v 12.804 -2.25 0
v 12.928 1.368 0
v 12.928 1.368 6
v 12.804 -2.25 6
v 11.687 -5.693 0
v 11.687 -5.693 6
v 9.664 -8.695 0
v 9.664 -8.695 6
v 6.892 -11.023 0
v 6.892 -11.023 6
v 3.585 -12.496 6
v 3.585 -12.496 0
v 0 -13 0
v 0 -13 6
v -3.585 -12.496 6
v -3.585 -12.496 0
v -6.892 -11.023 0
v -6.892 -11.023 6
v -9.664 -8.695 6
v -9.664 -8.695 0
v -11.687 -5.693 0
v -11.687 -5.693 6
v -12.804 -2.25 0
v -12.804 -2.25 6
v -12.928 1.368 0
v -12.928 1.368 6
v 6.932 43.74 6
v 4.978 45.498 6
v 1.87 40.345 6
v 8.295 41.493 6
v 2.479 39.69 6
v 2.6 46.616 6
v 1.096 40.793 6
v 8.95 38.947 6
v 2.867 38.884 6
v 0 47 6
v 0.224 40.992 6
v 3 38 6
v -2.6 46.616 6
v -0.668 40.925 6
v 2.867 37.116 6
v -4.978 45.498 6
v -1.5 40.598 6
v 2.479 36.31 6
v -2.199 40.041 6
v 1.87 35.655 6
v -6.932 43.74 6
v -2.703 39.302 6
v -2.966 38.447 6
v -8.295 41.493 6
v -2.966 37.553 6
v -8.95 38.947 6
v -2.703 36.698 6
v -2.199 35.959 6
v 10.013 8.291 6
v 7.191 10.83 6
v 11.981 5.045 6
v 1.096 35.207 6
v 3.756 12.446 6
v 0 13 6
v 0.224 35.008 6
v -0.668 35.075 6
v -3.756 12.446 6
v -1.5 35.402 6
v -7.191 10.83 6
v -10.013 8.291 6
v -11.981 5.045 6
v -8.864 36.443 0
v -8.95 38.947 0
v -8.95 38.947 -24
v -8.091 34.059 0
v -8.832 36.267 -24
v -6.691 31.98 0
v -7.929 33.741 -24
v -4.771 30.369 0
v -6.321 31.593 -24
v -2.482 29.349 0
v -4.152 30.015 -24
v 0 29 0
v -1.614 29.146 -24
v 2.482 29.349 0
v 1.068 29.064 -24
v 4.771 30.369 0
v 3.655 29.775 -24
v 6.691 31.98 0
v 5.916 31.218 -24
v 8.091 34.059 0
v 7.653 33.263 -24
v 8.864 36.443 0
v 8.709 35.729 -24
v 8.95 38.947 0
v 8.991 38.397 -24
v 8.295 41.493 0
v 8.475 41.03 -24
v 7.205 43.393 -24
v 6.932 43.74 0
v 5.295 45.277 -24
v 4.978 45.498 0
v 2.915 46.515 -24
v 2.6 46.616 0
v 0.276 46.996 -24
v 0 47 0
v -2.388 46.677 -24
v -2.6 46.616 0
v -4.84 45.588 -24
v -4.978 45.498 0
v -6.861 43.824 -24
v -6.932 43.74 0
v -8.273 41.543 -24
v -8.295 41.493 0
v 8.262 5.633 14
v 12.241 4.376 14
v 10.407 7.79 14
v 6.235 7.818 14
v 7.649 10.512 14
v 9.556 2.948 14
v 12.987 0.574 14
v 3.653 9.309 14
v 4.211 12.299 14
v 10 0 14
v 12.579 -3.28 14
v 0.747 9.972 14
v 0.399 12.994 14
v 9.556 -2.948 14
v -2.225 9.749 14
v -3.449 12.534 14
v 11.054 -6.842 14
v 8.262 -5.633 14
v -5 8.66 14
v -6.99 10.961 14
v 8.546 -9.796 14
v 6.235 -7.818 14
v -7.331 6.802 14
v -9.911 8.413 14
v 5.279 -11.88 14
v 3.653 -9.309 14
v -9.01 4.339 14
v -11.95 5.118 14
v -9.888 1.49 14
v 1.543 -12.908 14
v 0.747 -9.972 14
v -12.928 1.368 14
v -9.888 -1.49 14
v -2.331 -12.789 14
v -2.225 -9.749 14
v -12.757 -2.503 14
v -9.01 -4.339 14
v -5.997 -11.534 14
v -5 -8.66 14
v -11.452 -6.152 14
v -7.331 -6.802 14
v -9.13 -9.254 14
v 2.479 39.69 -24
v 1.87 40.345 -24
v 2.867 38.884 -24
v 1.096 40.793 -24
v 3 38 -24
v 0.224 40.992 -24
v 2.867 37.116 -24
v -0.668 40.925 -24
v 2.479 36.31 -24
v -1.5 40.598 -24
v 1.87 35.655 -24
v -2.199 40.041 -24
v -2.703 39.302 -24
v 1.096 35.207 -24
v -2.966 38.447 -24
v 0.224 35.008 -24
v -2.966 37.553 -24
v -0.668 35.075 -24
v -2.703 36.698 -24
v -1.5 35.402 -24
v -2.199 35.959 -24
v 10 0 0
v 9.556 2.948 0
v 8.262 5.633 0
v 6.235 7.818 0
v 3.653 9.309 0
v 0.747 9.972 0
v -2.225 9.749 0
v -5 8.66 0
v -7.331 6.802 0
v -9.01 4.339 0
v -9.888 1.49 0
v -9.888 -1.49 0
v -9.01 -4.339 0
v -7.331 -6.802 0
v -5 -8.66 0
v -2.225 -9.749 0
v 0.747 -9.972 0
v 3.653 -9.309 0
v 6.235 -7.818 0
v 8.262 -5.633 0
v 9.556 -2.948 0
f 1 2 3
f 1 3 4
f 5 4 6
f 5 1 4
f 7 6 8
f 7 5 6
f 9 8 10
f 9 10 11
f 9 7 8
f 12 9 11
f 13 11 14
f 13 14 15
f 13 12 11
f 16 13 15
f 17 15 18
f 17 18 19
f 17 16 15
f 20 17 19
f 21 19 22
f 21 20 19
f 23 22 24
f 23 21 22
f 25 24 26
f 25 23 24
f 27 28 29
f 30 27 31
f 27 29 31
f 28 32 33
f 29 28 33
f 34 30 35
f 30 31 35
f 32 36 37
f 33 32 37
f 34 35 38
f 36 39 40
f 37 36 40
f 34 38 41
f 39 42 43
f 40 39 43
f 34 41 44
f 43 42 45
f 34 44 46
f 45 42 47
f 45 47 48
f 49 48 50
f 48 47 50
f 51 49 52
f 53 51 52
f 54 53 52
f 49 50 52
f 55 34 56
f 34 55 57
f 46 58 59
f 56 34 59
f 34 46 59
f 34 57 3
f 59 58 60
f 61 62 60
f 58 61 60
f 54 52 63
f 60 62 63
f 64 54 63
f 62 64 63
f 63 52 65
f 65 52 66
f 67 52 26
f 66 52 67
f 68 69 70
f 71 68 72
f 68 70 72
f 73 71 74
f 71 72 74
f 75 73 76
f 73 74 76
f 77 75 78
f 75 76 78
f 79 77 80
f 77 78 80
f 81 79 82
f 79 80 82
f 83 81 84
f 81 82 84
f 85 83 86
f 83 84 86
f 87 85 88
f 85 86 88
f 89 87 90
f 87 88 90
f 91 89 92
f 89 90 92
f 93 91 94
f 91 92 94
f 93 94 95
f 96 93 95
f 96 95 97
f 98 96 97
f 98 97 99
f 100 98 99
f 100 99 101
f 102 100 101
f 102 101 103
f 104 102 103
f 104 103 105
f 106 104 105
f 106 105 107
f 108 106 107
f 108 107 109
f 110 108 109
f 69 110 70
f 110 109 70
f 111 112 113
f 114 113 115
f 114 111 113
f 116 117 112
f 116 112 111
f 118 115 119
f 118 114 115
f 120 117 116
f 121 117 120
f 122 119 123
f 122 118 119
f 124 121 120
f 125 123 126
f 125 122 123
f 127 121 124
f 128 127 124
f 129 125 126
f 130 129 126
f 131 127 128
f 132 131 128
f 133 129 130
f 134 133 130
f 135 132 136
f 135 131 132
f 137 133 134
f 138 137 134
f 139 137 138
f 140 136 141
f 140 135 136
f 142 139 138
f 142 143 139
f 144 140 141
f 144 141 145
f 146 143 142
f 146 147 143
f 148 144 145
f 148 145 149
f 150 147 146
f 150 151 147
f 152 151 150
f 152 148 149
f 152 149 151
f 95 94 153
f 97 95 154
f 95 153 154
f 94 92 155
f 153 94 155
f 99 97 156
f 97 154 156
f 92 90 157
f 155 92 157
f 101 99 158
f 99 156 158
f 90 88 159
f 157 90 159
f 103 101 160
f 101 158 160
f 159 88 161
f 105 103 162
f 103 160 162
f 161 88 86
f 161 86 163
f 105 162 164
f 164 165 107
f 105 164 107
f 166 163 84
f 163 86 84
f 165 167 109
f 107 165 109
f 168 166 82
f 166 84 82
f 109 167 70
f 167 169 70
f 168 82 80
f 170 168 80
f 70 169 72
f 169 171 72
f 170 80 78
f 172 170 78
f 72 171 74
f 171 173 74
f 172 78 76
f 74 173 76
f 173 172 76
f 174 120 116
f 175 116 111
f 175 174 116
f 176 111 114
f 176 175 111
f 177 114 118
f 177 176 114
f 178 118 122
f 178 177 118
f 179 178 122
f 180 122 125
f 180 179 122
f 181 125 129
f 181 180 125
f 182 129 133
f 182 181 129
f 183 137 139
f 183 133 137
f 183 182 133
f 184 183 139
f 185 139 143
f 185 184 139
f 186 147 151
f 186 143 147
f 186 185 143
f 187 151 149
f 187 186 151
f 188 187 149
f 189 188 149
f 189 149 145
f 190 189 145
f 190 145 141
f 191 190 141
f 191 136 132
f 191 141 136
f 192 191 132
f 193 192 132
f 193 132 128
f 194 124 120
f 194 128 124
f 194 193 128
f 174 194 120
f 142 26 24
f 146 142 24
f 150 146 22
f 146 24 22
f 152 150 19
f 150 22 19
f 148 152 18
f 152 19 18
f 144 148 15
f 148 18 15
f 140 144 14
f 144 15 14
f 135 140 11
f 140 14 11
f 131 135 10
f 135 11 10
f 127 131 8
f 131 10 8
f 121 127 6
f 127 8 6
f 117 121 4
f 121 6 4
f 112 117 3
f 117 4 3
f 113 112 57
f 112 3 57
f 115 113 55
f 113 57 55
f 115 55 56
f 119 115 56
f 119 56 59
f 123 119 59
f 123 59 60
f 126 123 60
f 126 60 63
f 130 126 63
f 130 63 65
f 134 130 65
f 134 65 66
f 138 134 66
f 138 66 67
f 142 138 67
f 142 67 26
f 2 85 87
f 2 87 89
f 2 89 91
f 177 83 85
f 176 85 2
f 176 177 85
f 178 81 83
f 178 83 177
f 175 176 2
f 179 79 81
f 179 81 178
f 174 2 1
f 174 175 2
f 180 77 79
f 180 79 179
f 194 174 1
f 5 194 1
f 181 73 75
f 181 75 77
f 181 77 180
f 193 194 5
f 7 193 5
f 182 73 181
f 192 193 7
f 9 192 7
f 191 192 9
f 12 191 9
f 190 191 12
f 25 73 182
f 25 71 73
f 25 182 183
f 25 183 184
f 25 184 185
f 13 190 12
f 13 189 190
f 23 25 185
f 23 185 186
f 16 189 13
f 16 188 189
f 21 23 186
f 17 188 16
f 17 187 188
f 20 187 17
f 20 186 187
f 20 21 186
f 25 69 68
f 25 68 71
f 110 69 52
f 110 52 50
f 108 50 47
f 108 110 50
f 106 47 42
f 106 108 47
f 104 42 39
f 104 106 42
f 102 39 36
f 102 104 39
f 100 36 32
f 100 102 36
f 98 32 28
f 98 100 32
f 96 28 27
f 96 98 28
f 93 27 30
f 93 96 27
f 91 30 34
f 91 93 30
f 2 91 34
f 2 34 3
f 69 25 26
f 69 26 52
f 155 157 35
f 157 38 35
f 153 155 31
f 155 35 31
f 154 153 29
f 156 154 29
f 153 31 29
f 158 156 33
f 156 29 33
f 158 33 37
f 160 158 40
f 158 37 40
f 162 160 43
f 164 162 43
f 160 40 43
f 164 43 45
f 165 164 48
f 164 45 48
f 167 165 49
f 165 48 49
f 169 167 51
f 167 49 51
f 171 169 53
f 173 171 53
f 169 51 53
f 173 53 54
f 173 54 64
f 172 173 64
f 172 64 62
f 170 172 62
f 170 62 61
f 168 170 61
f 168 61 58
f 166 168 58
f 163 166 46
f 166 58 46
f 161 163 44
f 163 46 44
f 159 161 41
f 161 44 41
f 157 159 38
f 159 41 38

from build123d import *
from build123d.topology import SkipClean

# Parameters (mm, degrees)
BOSS_EXTRUDE1_DEPTH = 6
BOSS_EXTRUDE2_START = 6
SKETCH3_R           = 13
BOSS_EXTRUDE2_DEPTH = 8
BOSS_EXTRUDE3_START = -24
SKETCH4_R           = 9
BOSS_EXTRUDE3_DEPTH = 24
SKETCH5_R           = 10
SKETCH5_R_2         = 3
CUT_EXTRUDE1_DEPTH  = 30


with BuildPart() as part:
    # Sketch2 → Boss-Extrude1 (new body)
    with BuildSketch(Plane(origin=(0, 0, 0), x_dir=(0, 1, 0), z_dir=(0, 0, 1))):
        with BuildLine():
            Line((1.368421053, 12.927777219), (38.947368421, 8.949999613))
            ThreePointArc((38.947368421, 8.949999613), (47, 0), (38.947368421, -8.949999613))
            Line((38.947368421, -8.949999613), (1.368421053, -12.927777219))
            ThreePointArc((1.368421053, -12.927777219), (-13, 0), (1.368421053, 12.927777219))
        make_face()
    extrude(amount=BOSS_EXTRUDE1_DEPTH)

    # Sketch3 → Boss-Extrude2 (add)
    with SkipClean():  # the faces are left unmerged after this step: merging them gives an invalid solid
        with BuildSketch(Plane(origin=(0, 0, 0), x_dir=(0, 1, 0), z_dir=(0, 0, 1)).offset(BOSS_EXTRUDE2_START)):
            with Locations(Location((0, 0, 0), (0, 0, 83.957671581))):
                Circle(SKETCH3_R)
        extrude(amount=BOSS_EXTRUDE2_DEPTH)

    # Sketch4 → Boss-Extrude3 (add)
    with SkipClean():  # the faces are left unmerged after this step: merging them gives an invalid solid
        with BuildSketch(Plane(origin=(0, 0, 0), x_dir=(0, 1, 0), z_dir=(0, 0, 1)).offset(BOSS_EXTRUDE3_START)):
            with Locations(Location((38, 0, 0), (0, 0, 83.957671581))):
                Circle(SKETCH4_R)
        extrude(amount=BOSS_EXTRUDE3_DEPTH)

    # Sketch5 → Cut-Extrude1 (cut, symmetric)
    with SkipClean():  # the faces are left unmerged after this step: merging them gives an invalid solid
        with BuildSketch(Plane(origin=(0, 0, 0), x_dir=(0, 1, 0), z_dir=(0, 0, 1))):
            with Locations(Location((0, 0, 0), (0, 0, 270))):
                Circle(SKETCH5_R)
            with Locations(Location((38, 0, 0), (0, 0, 270))):
                Circle(SKETCH5_R_2)
        extrude(amount=CUT_EXTRUDE1_DEPTH, both=True, mode=Mode.SUBTRACT)


solid = part.part
